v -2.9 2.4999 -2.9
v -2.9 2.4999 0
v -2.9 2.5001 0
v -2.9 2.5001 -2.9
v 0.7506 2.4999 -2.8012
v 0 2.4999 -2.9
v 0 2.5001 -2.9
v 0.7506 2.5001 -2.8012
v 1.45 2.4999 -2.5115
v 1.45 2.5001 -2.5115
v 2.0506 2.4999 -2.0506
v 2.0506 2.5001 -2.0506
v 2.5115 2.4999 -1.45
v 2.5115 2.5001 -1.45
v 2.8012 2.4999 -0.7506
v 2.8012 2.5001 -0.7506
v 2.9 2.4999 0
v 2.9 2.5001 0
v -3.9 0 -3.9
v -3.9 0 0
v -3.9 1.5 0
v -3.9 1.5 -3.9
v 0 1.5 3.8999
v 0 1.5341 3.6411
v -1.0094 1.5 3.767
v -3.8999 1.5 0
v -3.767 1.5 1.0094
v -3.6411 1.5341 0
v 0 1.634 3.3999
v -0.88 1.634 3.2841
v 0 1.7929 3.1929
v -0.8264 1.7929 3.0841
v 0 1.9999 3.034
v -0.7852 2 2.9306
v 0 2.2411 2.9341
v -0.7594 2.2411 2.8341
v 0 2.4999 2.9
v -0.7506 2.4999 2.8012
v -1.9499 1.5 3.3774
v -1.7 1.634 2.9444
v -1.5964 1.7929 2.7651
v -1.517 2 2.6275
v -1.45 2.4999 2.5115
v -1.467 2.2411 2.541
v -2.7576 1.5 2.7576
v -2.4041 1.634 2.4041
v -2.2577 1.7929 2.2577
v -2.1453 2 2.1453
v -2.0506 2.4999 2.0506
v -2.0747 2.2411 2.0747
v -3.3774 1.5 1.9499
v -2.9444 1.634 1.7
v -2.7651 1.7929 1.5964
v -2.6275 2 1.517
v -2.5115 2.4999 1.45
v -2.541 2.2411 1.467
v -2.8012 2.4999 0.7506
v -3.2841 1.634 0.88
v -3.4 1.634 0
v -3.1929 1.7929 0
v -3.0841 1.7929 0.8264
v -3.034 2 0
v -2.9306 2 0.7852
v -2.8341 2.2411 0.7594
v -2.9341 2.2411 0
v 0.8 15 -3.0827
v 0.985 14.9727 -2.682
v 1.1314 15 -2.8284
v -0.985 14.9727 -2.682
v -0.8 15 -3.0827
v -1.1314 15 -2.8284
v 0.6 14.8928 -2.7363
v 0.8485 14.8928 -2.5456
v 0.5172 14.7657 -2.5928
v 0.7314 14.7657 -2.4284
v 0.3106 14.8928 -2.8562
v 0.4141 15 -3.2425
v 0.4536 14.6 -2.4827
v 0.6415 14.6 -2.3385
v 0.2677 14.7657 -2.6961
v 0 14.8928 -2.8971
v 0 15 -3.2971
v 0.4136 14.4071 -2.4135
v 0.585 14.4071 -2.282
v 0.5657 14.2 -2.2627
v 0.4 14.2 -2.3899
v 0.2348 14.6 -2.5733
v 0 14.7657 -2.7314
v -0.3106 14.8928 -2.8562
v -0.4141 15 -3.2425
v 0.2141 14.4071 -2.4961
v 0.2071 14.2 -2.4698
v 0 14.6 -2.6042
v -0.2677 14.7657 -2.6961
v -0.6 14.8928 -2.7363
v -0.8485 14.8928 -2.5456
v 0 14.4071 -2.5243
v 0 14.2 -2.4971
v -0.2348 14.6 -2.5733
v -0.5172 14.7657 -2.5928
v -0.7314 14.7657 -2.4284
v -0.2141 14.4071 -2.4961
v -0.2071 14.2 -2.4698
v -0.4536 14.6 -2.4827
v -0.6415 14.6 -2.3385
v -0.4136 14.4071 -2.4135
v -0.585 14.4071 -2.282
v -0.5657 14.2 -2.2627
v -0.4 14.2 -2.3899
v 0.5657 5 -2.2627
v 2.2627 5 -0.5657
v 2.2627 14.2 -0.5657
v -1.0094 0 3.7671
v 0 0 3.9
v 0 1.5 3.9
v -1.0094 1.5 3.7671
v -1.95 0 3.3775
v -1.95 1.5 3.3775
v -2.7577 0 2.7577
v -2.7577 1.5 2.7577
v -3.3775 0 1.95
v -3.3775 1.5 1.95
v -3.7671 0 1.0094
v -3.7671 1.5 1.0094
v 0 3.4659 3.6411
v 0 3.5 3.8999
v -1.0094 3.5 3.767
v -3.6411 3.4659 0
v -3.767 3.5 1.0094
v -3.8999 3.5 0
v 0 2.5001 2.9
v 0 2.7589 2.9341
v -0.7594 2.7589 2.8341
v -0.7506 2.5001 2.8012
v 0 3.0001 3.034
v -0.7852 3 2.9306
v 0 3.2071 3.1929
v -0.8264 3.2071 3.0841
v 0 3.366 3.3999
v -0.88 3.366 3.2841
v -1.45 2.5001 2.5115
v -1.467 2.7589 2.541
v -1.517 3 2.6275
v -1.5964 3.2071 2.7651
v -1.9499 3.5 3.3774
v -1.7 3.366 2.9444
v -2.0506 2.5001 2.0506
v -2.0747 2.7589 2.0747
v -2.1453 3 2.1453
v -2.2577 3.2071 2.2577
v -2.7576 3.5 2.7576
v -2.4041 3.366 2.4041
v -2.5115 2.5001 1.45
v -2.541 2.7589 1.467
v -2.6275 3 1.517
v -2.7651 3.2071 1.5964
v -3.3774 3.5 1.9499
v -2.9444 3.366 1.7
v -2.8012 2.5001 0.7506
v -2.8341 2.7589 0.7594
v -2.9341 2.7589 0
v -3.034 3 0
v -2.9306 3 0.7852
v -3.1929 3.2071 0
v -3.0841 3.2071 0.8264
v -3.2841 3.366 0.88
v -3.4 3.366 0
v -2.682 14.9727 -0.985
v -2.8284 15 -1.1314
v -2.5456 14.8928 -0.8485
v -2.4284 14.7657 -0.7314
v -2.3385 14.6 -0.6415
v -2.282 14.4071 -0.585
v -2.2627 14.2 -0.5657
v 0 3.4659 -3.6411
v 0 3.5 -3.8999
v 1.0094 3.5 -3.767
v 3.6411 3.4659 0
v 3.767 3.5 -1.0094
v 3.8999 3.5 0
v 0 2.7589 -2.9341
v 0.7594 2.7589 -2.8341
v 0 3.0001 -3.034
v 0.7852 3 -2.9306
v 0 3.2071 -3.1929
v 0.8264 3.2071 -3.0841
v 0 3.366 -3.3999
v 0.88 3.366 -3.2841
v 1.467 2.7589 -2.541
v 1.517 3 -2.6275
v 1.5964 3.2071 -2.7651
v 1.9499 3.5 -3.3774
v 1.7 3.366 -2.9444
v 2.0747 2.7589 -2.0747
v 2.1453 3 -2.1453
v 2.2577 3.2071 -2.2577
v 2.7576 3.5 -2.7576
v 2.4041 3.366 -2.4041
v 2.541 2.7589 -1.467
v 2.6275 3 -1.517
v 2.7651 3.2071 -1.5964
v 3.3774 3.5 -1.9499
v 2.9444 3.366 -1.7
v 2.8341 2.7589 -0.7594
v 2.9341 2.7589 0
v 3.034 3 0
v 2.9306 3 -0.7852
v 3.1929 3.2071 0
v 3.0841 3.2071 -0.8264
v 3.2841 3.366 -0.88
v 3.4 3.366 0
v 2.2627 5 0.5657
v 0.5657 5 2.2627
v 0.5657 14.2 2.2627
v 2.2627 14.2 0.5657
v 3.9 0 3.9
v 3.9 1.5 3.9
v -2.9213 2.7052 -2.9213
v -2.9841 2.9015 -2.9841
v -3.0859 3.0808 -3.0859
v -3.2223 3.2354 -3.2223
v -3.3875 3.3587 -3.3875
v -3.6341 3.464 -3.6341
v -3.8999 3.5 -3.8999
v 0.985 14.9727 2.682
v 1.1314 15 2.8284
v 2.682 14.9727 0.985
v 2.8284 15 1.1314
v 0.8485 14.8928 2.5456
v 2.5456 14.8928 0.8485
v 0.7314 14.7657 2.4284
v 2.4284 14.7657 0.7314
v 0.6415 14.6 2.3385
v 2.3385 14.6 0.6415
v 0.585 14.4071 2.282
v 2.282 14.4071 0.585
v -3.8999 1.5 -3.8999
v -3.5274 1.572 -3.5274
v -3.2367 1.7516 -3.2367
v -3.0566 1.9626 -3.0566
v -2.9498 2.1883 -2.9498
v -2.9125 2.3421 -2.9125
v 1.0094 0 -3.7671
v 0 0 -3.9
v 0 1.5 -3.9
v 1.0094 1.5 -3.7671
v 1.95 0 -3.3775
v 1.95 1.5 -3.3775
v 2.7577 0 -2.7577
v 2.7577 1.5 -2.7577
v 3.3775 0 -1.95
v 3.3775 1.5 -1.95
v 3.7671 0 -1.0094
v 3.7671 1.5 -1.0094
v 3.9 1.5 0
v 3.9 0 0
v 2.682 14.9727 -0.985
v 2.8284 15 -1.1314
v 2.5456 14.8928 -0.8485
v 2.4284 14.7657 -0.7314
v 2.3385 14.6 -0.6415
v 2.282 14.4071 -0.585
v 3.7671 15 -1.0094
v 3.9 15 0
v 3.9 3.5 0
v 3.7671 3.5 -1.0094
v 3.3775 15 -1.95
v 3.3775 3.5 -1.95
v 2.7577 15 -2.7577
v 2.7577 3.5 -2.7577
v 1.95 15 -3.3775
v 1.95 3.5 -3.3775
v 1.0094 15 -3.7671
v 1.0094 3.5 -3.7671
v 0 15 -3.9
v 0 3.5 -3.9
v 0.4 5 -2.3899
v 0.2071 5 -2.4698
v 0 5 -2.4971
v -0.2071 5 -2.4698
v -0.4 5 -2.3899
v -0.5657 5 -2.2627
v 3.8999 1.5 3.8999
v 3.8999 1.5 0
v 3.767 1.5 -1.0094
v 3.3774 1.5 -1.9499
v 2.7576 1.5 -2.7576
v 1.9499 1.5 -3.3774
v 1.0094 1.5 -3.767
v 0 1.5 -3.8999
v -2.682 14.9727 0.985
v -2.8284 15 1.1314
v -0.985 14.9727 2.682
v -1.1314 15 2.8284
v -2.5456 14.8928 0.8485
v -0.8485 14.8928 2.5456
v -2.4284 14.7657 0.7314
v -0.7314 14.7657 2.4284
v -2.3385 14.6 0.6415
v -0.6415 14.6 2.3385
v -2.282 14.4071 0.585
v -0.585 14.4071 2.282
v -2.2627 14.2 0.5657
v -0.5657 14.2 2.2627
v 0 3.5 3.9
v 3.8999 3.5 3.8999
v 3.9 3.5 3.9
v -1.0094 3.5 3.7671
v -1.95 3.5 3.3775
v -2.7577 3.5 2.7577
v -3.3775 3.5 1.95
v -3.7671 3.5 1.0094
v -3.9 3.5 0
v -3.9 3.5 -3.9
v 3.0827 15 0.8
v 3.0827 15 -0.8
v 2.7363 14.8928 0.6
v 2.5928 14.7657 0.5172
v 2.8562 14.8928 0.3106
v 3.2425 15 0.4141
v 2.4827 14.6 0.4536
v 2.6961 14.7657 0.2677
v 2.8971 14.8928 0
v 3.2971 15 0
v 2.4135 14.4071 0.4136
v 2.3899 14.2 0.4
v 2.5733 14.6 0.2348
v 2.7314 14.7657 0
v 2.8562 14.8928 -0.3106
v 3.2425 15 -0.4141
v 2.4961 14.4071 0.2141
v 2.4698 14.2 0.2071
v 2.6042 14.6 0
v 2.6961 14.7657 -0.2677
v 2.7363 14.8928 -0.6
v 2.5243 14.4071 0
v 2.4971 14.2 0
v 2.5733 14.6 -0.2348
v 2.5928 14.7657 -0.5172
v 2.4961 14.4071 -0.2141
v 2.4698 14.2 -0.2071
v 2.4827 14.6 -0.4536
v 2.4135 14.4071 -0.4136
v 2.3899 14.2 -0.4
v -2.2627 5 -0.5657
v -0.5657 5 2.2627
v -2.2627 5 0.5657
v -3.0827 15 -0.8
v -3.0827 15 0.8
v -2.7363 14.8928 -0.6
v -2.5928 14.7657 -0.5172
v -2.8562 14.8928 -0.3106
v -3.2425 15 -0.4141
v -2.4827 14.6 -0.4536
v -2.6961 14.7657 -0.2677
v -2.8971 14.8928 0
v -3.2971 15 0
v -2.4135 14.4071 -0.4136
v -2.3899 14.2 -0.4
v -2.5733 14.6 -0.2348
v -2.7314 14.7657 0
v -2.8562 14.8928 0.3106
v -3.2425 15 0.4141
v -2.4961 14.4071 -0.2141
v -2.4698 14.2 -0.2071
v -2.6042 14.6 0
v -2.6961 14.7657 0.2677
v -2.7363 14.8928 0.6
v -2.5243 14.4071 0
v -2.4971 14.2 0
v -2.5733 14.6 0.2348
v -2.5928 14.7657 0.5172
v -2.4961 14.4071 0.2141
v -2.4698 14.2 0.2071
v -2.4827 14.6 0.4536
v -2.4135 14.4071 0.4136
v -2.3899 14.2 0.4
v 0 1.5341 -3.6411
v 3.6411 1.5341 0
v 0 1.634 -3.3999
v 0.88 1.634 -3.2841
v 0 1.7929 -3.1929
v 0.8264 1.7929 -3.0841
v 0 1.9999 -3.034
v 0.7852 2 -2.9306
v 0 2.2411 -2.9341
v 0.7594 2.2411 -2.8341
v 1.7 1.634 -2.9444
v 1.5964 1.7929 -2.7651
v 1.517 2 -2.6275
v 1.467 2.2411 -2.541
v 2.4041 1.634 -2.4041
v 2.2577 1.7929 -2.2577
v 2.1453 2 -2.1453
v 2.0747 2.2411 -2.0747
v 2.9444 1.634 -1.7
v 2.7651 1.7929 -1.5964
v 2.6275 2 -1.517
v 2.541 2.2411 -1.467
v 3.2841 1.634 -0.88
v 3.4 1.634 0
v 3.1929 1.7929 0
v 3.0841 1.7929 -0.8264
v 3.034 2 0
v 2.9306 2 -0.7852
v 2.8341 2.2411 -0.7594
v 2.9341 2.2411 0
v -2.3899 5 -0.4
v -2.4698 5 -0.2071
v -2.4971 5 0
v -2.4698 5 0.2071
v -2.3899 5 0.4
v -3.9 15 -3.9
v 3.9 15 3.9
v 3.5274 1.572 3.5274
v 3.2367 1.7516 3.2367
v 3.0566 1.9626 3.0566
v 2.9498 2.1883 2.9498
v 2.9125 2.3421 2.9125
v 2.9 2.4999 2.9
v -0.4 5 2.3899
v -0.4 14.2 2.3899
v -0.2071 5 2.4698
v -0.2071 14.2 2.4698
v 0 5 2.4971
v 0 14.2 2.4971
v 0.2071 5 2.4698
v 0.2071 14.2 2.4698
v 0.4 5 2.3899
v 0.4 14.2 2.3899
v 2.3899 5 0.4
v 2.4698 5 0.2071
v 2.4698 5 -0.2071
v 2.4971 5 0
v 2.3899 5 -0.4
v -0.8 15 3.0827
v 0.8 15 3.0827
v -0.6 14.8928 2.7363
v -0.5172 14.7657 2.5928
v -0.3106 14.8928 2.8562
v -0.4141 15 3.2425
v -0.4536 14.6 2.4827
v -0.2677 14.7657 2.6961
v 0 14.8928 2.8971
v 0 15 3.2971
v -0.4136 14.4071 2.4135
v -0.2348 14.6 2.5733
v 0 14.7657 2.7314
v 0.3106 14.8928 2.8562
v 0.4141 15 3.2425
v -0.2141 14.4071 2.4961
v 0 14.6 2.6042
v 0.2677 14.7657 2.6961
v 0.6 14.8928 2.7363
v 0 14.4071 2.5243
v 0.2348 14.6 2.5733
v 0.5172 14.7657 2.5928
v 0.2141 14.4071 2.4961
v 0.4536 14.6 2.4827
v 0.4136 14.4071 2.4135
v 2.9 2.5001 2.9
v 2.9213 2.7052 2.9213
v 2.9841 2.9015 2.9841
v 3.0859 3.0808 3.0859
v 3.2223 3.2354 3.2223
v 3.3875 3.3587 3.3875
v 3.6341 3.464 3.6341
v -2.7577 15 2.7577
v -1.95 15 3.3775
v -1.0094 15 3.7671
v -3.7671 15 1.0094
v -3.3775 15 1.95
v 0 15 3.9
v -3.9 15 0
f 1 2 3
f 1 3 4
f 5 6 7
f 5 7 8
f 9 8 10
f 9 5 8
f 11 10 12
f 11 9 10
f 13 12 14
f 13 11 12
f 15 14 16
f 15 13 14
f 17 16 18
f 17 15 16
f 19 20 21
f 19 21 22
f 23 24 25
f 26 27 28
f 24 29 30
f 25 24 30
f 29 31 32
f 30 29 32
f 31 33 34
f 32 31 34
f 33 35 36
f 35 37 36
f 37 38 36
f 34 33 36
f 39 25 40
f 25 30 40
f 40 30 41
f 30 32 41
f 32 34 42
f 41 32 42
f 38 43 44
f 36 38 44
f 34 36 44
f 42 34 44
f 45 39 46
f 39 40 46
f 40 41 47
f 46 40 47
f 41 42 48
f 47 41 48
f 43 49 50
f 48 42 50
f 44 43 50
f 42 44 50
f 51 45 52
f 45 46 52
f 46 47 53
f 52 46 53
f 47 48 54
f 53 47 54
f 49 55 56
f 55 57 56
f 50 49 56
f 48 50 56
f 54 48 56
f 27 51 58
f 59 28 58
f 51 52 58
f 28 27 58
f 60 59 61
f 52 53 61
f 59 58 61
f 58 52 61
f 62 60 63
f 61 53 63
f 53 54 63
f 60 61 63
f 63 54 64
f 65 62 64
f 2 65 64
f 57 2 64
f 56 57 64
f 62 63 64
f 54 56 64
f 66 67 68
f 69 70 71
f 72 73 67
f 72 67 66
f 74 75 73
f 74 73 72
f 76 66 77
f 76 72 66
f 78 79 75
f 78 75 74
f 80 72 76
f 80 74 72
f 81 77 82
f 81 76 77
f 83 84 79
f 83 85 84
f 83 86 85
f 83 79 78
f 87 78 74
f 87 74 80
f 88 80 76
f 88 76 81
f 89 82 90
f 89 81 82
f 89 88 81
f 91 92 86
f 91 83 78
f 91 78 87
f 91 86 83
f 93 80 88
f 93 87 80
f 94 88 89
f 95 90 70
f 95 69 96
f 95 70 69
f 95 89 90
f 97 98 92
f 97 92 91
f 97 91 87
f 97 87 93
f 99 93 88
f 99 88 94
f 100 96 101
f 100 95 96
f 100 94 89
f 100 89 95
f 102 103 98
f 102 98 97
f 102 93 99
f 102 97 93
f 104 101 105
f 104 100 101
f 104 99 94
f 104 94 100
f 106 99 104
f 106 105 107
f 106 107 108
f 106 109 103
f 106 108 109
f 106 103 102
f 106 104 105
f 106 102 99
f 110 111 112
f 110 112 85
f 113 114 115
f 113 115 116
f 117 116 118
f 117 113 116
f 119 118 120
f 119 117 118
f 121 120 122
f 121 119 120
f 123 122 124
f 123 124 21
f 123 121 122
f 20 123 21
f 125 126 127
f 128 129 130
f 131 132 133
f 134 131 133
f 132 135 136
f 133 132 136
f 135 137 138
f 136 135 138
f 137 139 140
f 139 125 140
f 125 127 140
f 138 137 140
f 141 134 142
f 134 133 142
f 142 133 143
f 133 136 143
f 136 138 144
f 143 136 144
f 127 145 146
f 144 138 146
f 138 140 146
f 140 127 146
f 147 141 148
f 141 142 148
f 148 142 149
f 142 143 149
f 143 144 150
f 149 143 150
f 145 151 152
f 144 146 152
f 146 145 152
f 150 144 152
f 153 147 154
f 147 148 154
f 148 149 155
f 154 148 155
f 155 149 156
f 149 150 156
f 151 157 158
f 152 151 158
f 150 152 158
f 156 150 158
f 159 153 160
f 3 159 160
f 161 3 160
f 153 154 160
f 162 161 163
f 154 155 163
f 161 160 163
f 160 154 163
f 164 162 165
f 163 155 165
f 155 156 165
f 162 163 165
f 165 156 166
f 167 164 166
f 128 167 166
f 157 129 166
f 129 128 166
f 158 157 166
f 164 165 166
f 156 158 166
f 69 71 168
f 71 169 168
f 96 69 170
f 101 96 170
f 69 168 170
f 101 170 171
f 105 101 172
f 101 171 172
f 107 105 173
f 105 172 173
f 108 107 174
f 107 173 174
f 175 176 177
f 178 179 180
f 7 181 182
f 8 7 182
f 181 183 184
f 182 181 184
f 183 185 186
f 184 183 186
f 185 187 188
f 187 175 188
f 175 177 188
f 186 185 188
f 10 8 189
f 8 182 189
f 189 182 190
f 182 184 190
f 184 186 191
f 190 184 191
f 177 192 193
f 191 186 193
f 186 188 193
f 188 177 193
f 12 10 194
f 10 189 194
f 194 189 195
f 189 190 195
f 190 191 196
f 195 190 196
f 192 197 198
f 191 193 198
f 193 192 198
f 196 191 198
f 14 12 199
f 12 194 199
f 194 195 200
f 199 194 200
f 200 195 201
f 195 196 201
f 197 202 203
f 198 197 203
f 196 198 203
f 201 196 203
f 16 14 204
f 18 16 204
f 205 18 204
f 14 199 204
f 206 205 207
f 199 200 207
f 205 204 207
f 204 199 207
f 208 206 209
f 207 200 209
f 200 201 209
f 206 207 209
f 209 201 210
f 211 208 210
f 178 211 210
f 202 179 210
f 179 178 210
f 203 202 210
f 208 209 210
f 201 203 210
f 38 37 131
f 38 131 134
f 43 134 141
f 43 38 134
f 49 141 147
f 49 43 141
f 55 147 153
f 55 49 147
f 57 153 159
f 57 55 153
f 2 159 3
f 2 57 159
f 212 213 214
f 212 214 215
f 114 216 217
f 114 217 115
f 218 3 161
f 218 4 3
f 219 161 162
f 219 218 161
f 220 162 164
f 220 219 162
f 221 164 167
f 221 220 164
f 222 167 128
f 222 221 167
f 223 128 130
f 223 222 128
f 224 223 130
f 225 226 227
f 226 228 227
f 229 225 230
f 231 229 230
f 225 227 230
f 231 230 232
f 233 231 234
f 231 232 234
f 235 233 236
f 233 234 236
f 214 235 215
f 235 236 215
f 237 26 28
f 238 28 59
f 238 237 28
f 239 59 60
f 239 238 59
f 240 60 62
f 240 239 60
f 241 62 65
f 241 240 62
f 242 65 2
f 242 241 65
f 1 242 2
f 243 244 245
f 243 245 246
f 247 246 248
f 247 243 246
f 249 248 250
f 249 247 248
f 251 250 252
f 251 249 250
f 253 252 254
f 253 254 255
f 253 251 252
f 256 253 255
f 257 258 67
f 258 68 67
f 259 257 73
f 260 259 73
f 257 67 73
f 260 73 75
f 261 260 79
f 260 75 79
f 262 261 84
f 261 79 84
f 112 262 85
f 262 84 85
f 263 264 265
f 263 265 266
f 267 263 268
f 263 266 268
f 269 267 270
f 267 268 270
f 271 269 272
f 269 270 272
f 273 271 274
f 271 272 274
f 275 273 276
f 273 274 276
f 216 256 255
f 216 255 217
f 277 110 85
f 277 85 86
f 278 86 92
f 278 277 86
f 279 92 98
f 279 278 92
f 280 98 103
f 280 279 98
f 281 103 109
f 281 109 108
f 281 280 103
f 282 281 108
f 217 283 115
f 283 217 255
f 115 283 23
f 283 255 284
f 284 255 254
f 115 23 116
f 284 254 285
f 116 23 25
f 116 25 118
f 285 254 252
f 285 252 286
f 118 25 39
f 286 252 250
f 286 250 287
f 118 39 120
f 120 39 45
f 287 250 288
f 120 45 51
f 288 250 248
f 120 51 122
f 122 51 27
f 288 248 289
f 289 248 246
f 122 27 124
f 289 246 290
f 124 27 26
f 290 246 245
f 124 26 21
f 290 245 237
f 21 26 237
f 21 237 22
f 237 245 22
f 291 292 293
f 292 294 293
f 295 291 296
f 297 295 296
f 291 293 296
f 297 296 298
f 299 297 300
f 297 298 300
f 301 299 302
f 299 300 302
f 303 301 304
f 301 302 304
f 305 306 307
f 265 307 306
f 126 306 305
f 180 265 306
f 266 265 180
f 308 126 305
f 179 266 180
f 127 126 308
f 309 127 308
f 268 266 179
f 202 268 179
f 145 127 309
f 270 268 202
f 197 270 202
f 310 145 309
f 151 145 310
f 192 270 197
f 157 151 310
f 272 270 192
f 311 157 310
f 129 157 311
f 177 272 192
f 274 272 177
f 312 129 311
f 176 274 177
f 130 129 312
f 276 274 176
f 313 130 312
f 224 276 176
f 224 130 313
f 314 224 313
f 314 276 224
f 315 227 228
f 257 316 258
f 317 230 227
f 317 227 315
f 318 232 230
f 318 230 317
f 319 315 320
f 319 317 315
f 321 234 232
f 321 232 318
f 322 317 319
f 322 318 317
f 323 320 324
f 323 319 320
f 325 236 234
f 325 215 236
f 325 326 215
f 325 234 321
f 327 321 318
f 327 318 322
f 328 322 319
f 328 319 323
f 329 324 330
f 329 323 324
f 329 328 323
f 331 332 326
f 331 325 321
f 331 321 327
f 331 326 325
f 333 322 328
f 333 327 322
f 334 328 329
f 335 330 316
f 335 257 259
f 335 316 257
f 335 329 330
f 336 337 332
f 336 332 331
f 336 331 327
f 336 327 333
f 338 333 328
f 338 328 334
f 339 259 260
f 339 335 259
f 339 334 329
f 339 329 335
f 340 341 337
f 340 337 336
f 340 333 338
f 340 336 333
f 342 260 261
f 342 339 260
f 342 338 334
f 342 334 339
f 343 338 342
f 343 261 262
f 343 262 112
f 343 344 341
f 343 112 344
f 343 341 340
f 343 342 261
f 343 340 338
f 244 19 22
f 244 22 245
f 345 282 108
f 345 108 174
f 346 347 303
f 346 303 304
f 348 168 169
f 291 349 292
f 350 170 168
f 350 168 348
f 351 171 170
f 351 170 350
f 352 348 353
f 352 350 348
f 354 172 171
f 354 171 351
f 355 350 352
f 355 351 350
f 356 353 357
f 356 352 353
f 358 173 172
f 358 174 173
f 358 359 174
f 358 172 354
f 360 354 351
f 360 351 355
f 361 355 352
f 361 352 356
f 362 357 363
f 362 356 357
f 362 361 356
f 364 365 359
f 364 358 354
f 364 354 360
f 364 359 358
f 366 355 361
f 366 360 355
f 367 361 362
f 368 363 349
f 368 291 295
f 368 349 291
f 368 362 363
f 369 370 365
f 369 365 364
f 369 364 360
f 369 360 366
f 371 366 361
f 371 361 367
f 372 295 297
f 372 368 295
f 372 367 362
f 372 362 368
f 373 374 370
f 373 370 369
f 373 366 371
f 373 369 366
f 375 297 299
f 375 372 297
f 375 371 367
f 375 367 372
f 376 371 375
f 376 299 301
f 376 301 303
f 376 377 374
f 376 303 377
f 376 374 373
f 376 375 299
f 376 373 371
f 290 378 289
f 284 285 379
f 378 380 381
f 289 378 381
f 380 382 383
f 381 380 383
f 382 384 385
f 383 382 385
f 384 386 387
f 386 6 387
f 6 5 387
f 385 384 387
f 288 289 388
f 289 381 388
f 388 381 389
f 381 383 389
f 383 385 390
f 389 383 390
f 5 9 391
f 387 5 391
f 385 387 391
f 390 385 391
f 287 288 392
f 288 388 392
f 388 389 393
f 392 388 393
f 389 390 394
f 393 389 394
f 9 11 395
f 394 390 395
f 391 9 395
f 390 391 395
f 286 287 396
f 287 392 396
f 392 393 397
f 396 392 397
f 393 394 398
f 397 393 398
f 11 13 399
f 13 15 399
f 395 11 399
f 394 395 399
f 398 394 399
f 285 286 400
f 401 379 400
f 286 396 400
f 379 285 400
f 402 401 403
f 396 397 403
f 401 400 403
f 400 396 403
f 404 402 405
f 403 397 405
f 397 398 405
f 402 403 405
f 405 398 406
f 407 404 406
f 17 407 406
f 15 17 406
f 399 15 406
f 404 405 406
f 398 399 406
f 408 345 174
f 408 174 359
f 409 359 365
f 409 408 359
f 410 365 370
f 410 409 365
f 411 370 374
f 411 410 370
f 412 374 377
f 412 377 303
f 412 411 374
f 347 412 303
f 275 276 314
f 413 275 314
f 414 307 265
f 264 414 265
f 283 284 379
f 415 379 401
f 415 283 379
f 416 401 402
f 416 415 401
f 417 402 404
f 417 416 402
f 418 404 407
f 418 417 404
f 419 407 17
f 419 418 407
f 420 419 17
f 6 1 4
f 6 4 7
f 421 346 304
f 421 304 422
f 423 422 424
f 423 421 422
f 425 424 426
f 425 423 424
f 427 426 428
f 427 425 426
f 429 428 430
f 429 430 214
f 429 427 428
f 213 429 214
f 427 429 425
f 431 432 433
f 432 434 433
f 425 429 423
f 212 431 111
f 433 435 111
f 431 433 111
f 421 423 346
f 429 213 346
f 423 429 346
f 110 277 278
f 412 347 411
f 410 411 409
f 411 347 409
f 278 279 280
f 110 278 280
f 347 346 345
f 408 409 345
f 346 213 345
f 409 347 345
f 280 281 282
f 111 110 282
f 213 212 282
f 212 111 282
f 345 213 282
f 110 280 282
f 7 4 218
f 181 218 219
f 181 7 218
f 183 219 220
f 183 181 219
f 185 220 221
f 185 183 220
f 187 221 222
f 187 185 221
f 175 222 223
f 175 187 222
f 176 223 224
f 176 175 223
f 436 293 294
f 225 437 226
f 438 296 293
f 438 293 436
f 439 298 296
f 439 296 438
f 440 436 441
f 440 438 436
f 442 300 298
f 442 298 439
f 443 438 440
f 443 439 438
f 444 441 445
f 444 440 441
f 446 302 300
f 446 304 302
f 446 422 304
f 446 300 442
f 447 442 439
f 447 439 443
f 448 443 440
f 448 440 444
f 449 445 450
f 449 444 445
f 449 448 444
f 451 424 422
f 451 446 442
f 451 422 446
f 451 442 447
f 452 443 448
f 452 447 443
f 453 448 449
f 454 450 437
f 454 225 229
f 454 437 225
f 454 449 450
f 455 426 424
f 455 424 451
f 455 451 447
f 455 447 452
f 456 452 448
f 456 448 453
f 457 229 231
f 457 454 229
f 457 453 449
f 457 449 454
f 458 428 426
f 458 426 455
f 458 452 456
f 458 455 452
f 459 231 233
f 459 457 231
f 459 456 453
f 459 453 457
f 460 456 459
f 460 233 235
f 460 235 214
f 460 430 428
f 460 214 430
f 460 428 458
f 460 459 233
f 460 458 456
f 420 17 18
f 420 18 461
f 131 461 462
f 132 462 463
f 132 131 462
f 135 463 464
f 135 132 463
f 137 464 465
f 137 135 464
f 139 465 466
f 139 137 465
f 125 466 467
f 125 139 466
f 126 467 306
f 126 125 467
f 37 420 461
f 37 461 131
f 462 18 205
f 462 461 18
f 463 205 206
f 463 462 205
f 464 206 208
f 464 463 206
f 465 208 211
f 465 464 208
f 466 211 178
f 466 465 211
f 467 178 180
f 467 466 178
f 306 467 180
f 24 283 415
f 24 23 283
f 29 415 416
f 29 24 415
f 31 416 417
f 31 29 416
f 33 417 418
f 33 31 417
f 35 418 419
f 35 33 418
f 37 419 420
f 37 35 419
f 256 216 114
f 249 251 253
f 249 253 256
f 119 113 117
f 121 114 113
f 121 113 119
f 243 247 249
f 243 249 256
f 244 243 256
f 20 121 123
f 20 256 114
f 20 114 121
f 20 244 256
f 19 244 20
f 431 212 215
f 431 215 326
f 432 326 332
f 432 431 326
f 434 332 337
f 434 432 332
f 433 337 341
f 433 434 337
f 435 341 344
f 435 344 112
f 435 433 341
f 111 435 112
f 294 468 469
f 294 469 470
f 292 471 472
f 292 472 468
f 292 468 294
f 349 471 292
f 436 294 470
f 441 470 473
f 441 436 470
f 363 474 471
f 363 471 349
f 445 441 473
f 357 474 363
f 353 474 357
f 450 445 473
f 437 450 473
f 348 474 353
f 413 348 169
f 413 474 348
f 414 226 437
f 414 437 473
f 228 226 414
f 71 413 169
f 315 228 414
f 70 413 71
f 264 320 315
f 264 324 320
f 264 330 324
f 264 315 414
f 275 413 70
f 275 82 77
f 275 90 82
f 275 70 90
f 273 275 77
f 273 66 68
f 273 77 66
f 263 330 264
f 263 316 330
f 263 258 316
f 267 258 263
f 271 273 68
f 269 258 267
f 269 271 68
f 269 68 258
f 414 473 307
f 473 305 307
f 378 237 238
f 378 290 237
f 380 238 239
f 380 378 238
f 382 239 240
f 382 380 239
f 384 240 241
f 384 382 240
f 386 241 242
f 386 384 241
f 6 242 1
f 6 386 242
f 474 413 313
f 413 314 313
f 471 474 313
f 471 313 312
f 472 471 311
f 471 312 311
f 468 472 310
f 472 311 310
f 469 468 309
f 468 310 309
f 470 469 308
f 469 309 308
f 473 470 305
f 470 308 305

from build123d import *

# Parameters (mm, degrees)
BOSS_EXTRUDE1_DEPTH     = 5
CUT_EXTRUDE2_DEPTH      = 1
CUT_EXTRUDE2_DEPTH_BACK = 1
FILLET1_R               = 1
BOSS_EXTRUDE3_DEPTH     = 10
FILLET2_R               = 0.8


with BuildPart() as part:
    # Sketch1 → Boss-Extrude1 (new body)
    with BuildSketch(Plane(origin=(0, 0, 0), x_dir=(1, 0, 0), z_dir=(0, 1, 0))):
        with BuildLine():
            Line((-3.9, 3.9), (0, 3.9))
            ThreePointArc((0, 3.9), (2.757716447, 2.757716447), (3.9, 0))
            Line((3.9, 0), (3.9, -3.9))
            Line((3.9, -3.9), (0, -3.9))
            ThreePointArc((0, -3.9), (-2.757716447, -2.757716447), (-3.9, 0))
            Line((-3.9, 0), (-3.9, 3.9))
        make_face()
    extrude(amount=BOSS_EXTRUDE1_DEPTH)

    # Sketch3 → Cut-Extrude2 (cut, two sides: drawn at the far end of the back side and taken through both)
    with BuildSketch(Plane(origin=(0, 2.5, 0), x_dir=(1, 0, 0), z_dir=(0, 1, 0)).offset(-CUT_EXTRUDE2_DEPTH_BACK)):
        with BuildLine():
            Line((-3.9, 0), (-3.9, 3.9))
            Line((-3.9, 3.9), (0, 3.9))
            ThreePointArc((0, 3.9), (2.757716447, 2.757716447), (3.9, 0))
            Line((3.9, 0), (3.9, -3.9))
            Line((3.9, -3.9), (0, -3.9))
            ThreePointArc((0, -3.9), (-2.757716447, -2.757716447), (-3.9, 0))
        make_face()
        with BuildLine():
            Line((-2.9, 0), (-2.9, 2.9))
            Line((-2.9, 2.9), (0, 2.9))
            ThreePointArc((0, 2.9), (2.050609665, 2.050609665), (2.9, 0))
            Line((2.9, 0), (2.9, -2.9))
            Line((2.9, -2.9), (0, -2.9))
            ThreePointArc((0, -2.9), (-2.050609665, -2.050609665), (-2.9, 0))
        make_face(mode=Mode.SUBTRACT)
    extrude(amount=CUT_EXTRUDE2_DEPTH + CUT_EXTRUDE2_DEPTH_BACK, mode=Mode.SUBTRACT)

    # Fillet1
    fillet1_edges = [part.edges().sort_by_distance(p)[0] for p in [
        (2.9, 3.5, 1.45),
        (2.050609665, 3.5, -2.050609665),
        (1.45, 3.5, 2.9),
        (-2.050609665, 3.5, 2.050609665),
        (2.9, 1.5, 1.45),
        (2.050609665, 1.5, -2.050609665),
        (-2.9, 1.5, -1.45),
        (1.45, 1.5, 2.9),
        (-1.45, 3.5, -2.9),
        (-2.9, 3.5, -1.45),
        (-1.45, 1.5, -2.9),
        (-2.050609665, 1.5, 2.050609665),
    ]]
    fillet(fillet1_edges, radius=FILLET1_R - 0.0001)  # a hair under: the kernel refuses the full size

    # Sketch4 → Boss-Extrude3 (add)
    with BuildSketch(Plane(origin=(0, 5, 0), x_dir=(1, 0, 0), z_dir=(0, 1, 0))):
        with BuildLine():
            Line((0, 3.9), (-3.9, 3.9))
            Line((-3.9, 3.9), (-3.9, 0))
            ThreePointArc((-3.9, 0), (-2.757716447, -2.757716447), (0, -3.9))
            Line((0, -3.9), (3.9, -3.9))
            Line((3.9, -3.9), (3.9, 0))
            ThreePointArc((3.9, 0), (2.757716447, 2.757716447), (0, 3.9))
        make_face()
        with BuildLine():
            Line((-2.2627417, -0.565685425), (-0.565685425, -2.2627417))
            ThreePointArc((-0.565685425, -2.2627417), (0, -2.497056275), (0.565685425, -2.2627417))
            Line((0.565685425, -2.2627417), (2.2627417, -0.565685425))
            ThreePointArc((2.2627417, -0.565685425), (2.497056275, 0), (2.2627417, 0.565685425))
            Line((2.2627417, 0.565685425), (0.565685425, 2.2627417))
            ThreePointArc((0.565685425, 2.2627417), (0, 2.497056275), (-0.565685425, 2.2627417))
            Line((-0.565685425, 2.2627417), (-2.2627417, 0.565685425))
            ThreePointArc((-2.2627417, 0.565685425), (-2.497056275, 0), (-2.2627417, -0.565685425))
        make_face(mode=Mode.SUBTRACT)
    extrude(amount=BOSS_EXTRUDE3_DEPTH)

    # Fillet2
    fillet2_edges = [part.edges().sort_by_distance(p)[0] for p in [
        (0, 15, 2.497056275),
        (1.414213562, 15, 1.414213562),
        (2.497056275, 15, 0),
        (1.414213562, 15, -1.414213562),
        (0, 15, -2.497056275),
        (-1.414213562, 15, -1.414213562),
        (-2.497056275, 15, 0),
        (-1.414213562, 15, 1.414213562),
    ]]
    fillet(fillet2_edges, radius=FILLET2_R)


solid = part.part
